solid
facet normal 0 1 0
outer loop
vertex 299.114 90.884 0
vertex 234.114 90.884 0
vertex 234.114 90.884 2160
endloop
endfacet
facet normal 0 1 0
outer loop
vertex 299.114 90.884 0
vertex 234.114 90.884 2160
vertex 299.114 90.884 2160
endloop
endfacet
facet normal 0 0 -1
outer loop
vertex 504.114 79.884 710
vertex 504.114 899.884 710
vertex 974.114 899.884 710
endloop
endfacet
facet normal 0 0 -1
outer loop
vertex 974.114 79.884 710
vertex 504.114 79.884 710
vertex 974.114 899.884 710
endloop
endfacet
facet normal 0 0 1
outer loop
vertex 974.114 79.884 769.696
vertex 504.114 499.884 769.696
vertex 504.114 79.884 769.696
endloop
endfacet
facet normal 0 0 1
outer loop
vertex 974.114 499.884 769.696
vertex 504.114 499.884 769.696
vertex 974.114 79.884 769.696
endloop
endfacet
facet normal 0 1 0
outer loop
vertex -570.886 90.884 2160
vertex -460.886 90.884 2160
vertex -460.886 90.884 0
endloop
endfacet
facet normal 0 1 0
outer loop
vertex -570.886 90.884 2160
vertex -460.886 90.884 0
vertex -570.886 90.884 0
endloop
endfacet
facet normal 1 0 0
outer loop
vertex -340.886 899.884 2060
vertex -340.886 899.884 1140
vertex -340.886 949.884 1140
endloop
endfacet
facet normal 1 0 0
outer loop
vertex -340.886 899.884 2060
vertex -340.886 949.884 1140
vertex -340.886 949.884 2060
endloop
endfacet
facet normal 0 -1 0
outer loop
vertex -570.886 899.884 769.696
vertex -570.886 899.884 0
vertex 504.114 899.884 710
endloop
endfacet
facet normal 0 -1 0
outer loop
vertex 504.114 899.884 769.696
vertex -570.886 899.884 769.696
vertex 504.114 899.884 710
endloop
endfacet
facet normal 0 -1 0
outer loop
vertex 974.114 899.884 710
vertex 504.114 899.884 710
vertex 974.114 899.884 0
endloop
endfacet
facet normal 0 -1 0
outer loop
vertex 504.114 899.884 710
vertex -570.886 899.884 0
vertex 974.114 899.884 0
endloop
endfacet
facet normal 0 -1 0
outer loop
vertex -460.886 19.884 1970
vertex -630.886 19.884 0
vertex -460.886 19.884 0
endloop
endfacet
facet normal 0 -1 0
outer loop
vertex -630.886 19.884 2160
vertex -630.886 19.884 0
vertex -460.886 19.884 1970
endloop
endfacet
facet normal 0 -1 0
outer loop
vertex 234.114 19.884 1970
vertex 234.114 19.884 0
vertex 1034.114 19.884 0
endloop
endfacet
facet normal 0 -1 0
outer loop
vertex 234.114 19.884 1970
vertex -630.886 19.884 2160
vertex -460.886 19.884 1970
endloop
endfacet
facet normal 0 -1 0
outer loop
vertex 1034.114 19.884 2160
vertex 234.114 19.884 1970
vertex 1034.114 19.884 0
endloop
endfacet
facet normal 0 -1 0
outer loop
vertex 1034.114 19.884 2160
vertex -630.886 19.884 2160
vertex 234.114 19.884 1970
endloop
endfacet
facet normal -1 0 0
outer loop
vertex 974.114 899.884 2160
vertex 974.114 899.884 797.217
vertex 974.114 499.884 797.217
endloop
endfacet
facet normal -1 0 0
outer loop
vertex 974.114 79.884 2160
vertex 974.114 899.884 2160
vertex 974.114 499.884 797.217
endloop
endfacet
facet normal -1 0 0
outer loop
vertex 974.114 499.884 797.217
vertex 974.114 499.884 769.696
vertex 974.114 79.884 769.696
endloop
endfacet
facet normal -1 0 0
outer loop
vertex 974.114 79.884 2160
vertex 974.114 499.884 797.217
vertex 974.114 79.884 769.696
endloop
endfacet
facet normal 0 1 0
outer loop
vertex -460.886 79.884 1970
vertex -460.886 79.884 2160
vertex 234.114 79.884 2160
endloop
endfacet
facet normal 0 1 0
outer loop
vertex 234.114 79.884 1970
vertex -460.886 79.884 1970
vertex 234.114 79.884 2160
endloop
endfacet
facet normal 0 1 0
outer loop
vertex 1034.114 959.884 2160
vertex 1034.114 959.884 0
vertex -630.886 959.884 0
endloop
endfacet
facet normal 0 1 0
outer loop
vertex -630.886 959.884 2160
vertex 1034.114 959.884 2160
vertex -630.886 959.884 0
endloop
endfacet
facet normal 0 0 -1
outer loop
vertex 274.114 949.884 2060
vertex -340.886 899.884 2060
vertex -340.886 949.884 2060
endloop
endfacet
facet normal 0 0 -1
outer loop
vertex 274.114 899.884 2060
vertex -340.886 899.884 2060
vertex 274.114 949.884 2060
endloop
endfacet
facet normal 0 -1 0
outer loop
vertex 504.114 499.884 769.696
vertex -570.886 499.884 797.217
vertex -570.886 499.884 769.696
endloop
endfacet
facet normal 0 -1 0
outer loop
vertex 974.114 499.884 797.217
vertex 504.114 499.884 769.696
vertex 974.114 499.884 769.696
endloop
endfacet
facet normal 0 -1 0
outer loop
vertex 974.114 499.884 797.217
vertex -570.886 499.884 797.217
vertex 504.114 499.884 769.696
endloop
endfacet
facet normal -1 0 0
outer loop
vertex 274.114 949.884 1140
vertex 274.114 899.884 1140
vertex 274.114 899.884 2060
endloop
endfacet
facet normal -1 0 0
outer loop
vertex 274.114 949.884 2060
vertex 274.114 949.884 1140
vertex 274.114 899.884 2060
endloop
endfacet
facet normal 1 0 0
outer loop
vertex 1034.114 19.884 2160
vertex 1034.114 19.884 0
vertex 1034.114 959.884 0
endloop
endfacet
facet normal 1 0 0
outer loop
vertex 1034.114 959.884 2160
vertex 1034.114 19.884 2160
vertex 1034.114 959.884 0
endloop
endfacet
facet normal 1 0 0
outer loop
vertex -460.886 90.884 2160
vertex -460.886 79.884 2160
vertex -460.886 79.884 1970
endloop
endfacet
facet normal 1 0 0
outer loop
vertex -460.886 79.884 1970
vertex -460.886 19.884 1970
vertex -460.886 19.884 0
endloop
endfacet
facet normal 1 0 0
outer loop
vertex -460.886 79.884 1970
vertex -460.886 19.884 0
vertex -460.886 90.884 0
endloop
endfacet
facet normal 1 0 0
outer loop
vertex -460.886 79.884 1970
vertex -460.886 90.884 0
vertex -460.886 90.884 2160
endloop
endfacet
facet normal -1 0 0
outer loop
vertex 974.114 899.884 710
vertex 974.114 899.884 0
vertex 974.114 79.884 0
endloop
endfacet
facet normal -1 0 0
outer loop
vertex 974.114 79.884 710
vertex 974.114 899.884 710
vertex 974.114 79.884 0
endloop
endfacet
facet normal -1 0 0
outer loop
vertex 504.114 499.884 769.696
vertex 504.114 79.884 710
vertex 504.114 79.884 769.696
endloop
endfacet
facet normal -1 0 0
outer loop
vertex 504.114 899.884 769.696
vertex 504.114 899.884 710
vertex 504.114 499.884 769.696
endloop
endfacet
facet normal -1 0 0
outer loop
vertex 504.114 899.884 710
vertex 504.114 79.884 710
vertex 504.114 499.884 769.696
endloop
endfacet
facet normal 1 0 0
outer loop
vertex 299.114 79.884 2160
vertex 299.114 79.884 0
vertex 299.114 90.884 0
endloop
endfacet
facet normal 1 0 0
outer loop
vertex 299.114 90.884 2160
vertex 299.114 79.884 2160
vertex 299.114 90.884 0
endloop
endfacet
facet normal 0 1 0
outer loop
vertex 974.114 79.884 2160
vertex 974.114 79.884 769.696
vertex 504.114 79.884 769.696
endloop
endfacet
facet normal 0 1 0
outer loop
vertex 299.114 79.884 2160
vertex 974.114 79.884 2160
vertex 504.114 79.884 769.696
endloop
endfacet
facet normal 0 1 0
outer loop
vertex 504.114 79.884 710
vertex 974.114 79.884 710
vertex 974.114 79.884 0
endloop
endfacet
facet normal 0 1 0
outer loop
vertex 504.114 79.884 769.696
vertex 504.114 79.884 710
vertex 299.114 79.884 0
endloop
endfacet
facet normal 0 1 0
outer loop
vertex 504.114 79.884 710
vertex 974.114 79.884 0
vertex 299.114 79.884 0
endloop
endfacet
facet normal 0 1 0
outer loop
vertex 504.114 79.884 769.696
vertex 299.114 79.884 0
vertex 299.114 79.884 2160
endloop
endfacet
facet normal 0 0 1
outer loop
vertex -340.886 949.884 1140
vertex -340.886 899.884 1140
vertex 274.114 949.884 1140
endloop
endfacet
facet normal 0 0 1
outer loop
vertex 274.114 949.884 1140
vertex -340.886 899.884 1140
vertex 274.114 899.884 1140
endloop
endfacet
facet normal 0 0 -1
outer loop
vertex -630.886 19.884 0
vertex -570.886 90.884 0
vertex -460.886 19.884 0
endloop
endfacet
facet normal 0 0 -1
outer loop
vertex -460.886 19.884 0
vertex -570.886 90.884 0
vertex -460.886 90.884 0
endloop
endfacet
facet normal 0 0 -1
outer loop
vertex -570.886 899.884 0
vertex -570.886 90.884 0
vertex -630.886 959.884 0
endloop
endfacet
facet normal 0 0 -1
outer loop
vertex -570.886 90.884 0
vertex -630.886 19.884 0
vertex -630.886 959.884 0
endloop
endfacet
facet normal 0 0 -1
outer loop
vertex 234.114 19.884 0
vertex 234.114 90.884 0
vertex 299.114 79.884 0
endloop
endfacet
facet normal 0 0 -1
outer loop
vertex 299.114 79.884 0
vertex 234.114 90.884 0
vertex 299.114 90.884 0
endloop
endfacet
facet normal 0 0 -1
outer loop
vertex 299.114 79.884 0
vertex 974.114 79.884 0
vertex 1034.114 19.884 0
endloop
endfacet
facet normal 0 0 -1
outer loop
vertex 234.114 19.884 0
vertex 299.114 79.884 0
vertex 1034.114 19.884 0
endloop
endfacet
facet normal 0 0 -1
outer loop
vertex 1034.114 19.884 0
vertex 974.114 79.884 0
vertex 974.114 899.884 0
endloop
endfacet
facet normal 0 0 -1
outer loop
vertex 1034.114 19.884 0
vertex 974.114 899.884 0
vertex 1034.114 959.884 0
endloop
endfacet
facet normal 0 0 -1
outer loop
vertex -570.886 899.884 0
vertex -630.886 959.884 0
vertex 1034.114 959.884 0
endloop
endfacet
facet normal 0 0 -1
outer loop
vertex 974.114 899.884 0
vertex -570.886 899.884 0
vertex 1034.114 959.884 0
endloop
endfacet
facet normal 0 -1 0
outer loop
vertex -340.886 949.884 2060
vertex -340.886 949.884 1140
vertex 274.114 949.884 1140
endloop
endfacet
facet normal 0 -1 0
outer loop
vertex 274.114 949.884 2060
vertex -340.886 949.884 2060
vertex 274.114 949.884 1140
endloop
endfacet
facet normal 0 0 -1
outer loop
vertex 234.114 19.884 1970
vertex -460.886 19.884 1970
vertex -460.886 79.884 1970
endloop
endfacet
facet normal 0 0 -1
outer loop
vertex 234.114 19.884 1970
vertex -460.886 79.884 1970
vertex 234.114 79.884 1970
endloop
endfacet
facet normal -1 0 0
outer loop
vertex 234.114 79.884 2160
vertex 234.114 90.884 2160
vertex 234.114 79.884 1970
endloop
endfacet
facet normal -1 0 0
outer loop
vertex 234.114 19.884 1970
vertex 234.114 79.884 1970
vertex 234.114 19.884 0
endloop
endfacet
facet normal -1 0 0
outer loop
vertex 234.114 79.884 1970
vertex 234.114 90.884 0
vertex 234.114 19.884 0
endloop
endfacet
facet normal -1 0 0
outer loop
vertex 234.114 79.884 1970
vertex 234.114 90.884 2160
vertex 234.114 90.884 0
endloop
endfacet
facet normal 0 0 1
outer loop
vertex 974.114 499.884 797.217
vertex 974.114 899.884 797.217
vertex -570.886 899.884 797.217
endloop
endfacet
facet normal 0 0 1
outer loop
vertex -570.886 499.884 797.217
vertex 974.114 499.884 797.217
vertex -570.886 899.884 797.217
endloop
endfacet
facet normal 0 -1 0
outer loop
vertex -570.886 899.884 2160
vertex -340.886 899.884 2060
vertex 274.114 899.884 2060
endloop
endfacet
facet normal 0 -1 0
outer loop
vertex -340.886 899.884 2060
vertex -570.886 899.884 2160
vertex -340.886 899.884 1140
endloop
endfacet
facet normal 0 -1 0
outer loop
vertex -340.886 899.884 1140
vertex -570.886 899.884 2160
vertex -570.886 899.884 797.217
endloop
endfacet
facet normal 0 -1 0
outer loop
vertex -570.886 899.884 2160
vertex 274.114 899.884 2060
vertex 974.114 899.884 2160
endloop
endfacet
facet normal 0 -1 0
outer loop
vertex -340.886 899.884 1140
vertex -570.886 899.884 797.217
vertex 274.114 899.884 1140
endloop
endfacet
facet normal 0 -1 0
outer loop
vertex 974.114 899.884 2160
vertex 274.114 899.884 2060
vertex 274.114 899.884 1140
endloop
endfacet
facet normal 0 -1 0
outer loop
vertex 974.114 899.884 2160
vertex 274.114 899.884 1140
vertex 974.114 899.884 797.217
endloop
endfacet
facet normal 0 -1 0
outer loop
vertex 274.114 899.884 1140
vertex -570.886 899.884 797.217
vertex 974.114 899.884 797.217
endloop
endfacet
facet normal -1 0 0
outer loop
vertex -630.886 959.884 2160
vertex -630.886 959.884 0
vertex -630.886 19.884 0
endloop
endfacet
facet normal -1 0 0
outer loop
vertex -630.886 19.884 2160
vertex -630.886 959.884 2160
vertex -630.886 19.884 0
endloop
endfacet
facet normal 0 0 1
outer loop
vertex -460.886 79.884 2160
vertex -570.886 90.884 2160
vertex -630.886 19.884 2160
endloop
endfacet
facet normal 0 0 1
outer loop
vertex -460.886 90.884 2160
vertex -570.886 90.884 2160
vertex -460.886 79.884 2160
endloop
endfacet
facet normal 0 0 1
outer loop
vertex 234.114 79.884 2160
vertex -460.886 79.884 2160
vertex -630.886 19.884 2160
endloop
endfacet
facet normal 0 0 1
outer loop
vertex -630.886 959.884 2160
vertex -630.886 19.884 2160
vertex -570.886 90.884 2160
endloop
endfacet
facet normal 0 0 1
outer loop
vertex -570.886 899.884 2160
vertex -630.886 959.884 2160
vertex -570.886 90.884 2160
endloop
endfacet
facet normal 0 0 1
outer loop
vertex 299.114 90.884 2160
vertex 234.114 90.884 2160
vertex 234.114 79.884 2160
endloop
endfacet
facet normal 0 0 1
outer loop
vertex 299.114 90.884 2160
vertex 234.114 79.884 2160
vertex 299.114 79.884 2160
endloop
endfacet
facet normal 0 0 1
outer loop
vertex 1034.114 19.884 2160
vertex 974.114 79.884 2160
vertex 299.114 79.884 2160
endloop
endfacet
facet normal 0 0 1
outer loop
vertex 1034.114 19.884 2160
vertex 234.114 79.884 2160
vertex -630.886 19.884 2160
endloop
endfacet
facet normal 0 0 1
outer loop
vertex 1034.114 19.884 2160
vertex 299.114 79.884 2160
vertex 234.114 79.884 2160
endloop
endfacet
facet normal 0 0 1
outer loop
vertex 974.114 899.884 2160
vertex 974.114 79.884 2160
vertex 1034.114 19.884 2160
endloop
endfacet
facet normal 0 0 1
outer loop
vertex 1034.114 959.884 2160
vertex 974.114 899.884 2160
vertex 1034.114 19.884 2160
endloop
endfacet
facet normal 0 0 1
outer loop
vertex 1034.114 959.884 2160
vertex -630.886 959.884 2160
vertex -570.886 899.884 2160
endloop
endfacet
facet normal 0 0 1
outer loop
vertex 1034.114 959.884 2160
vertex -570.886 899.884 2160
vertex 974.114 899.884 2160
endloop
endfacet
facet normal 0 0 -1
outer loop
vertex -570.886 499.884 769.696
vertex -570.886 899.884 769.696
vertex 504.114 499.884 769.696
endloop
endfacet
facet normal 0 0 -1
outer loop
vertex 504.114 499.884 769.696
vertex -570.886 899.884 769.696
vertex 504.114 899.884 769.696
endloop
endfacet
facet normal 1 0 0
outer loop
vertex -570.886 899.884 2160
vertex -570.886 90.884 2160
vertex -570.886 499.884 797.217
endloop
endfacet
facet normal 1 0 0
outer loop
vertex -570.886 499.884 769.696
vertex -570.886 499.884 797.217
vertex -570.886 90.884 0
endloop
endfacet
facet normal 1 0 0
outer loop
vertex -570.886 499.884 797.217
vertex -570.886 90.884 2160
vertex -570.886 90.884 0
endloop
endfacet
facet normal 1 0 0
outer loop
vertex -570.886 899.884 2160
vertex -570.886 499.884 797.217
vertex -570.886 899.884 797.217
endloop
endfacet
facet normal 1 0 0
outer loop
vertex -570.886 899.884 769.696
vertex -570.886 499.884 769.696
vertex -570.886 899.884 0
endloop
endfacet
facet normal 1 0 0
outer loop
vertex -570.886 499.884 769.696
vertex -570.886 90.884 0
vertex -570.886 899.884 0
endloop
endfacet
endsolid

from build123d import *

# Parameters (mm, degrees)
F0_W     = 65
F0_H     = 11
F1_DEPTH = 2160
F2_W     = 615
F2_H     = 920
F3_DEPTH = 50
F2_W_2   = 470
F2_H_2   = 59.696319
F4_DEPTH = 850
F5_W     = 695
F5_H     = 190
F6_DEPTH = 60
F7_DEPTH = 400


with BuildPart() as f1:
    # F0 (on Top) → F1 (new body)
    with BuildSketch(Plane.XY):
        Polygon((-570.886376, 90.884483), (-570.886376, 899.884483), (974.113624, 899.884483), (974.113624, 79.884483), (299.113624, 79.884483), (234.113624, 79.884483), (234.113624, 19.884483), (1034.113624, 19.884483), (1034.113624, 959.884483), (-630.886376, 959.884483), (-630.886376, 19.884483), (-570.886376, 19.884483), (-570.886376, 79.884483), align=None)
        Polygon((-460.886376, 90.884483), (-570.886376, 90.884483), (-570.886376, 79.884483), (-570.886376, 19.884483), (-460.886376, 19.884483), align=None)
        with Locations((266.613624, 85.384483)):
            Rectangle(F0_W, F0_H)
    extrude(amount=F1_DEPTH)

    # F2 (on face) → F3 (cut)
    with BuildSketch(Plane.XZ.offset(-899.884483)):
        with Locations((-33.386376, 1600)):
            Rectangle(F2_W, F2_H)
    extrude(amount=-F3_DEPTH, mode=Mode.SUBTRACT)

    # F2 (on face) → F4 (join)
    with BuildSketch(Plane.XZ.offset(-899.884483)):
        with Locations((739.113624, 739.84816)):
            Rectangle(F2_W_2, F2_H_2)
    extrude(amount=F4_DEPTH)

    # F5 (on face) → F6 (join)
    with BuildSketch(Plane.XZ.offset(-19.884483)):
        with Locations((-113.386376, 2065)):
            Rectangle(F5_W, F5_H)
    extrude(amount=-F6_DEPTH)

    # F2 (on face) → F7 (join)
    with BuildSketch(Plane.XZ.offset(-899.884483)):
        Polygon((974.113624, 797.217071), (-570.886376, 797.217071), (-570.886376, 769.696319), (504.113624, 769.696319), (974.113624, 769.696319), align=None)
    extrude(amount=F7_DEPTH)


solid = f1.part
